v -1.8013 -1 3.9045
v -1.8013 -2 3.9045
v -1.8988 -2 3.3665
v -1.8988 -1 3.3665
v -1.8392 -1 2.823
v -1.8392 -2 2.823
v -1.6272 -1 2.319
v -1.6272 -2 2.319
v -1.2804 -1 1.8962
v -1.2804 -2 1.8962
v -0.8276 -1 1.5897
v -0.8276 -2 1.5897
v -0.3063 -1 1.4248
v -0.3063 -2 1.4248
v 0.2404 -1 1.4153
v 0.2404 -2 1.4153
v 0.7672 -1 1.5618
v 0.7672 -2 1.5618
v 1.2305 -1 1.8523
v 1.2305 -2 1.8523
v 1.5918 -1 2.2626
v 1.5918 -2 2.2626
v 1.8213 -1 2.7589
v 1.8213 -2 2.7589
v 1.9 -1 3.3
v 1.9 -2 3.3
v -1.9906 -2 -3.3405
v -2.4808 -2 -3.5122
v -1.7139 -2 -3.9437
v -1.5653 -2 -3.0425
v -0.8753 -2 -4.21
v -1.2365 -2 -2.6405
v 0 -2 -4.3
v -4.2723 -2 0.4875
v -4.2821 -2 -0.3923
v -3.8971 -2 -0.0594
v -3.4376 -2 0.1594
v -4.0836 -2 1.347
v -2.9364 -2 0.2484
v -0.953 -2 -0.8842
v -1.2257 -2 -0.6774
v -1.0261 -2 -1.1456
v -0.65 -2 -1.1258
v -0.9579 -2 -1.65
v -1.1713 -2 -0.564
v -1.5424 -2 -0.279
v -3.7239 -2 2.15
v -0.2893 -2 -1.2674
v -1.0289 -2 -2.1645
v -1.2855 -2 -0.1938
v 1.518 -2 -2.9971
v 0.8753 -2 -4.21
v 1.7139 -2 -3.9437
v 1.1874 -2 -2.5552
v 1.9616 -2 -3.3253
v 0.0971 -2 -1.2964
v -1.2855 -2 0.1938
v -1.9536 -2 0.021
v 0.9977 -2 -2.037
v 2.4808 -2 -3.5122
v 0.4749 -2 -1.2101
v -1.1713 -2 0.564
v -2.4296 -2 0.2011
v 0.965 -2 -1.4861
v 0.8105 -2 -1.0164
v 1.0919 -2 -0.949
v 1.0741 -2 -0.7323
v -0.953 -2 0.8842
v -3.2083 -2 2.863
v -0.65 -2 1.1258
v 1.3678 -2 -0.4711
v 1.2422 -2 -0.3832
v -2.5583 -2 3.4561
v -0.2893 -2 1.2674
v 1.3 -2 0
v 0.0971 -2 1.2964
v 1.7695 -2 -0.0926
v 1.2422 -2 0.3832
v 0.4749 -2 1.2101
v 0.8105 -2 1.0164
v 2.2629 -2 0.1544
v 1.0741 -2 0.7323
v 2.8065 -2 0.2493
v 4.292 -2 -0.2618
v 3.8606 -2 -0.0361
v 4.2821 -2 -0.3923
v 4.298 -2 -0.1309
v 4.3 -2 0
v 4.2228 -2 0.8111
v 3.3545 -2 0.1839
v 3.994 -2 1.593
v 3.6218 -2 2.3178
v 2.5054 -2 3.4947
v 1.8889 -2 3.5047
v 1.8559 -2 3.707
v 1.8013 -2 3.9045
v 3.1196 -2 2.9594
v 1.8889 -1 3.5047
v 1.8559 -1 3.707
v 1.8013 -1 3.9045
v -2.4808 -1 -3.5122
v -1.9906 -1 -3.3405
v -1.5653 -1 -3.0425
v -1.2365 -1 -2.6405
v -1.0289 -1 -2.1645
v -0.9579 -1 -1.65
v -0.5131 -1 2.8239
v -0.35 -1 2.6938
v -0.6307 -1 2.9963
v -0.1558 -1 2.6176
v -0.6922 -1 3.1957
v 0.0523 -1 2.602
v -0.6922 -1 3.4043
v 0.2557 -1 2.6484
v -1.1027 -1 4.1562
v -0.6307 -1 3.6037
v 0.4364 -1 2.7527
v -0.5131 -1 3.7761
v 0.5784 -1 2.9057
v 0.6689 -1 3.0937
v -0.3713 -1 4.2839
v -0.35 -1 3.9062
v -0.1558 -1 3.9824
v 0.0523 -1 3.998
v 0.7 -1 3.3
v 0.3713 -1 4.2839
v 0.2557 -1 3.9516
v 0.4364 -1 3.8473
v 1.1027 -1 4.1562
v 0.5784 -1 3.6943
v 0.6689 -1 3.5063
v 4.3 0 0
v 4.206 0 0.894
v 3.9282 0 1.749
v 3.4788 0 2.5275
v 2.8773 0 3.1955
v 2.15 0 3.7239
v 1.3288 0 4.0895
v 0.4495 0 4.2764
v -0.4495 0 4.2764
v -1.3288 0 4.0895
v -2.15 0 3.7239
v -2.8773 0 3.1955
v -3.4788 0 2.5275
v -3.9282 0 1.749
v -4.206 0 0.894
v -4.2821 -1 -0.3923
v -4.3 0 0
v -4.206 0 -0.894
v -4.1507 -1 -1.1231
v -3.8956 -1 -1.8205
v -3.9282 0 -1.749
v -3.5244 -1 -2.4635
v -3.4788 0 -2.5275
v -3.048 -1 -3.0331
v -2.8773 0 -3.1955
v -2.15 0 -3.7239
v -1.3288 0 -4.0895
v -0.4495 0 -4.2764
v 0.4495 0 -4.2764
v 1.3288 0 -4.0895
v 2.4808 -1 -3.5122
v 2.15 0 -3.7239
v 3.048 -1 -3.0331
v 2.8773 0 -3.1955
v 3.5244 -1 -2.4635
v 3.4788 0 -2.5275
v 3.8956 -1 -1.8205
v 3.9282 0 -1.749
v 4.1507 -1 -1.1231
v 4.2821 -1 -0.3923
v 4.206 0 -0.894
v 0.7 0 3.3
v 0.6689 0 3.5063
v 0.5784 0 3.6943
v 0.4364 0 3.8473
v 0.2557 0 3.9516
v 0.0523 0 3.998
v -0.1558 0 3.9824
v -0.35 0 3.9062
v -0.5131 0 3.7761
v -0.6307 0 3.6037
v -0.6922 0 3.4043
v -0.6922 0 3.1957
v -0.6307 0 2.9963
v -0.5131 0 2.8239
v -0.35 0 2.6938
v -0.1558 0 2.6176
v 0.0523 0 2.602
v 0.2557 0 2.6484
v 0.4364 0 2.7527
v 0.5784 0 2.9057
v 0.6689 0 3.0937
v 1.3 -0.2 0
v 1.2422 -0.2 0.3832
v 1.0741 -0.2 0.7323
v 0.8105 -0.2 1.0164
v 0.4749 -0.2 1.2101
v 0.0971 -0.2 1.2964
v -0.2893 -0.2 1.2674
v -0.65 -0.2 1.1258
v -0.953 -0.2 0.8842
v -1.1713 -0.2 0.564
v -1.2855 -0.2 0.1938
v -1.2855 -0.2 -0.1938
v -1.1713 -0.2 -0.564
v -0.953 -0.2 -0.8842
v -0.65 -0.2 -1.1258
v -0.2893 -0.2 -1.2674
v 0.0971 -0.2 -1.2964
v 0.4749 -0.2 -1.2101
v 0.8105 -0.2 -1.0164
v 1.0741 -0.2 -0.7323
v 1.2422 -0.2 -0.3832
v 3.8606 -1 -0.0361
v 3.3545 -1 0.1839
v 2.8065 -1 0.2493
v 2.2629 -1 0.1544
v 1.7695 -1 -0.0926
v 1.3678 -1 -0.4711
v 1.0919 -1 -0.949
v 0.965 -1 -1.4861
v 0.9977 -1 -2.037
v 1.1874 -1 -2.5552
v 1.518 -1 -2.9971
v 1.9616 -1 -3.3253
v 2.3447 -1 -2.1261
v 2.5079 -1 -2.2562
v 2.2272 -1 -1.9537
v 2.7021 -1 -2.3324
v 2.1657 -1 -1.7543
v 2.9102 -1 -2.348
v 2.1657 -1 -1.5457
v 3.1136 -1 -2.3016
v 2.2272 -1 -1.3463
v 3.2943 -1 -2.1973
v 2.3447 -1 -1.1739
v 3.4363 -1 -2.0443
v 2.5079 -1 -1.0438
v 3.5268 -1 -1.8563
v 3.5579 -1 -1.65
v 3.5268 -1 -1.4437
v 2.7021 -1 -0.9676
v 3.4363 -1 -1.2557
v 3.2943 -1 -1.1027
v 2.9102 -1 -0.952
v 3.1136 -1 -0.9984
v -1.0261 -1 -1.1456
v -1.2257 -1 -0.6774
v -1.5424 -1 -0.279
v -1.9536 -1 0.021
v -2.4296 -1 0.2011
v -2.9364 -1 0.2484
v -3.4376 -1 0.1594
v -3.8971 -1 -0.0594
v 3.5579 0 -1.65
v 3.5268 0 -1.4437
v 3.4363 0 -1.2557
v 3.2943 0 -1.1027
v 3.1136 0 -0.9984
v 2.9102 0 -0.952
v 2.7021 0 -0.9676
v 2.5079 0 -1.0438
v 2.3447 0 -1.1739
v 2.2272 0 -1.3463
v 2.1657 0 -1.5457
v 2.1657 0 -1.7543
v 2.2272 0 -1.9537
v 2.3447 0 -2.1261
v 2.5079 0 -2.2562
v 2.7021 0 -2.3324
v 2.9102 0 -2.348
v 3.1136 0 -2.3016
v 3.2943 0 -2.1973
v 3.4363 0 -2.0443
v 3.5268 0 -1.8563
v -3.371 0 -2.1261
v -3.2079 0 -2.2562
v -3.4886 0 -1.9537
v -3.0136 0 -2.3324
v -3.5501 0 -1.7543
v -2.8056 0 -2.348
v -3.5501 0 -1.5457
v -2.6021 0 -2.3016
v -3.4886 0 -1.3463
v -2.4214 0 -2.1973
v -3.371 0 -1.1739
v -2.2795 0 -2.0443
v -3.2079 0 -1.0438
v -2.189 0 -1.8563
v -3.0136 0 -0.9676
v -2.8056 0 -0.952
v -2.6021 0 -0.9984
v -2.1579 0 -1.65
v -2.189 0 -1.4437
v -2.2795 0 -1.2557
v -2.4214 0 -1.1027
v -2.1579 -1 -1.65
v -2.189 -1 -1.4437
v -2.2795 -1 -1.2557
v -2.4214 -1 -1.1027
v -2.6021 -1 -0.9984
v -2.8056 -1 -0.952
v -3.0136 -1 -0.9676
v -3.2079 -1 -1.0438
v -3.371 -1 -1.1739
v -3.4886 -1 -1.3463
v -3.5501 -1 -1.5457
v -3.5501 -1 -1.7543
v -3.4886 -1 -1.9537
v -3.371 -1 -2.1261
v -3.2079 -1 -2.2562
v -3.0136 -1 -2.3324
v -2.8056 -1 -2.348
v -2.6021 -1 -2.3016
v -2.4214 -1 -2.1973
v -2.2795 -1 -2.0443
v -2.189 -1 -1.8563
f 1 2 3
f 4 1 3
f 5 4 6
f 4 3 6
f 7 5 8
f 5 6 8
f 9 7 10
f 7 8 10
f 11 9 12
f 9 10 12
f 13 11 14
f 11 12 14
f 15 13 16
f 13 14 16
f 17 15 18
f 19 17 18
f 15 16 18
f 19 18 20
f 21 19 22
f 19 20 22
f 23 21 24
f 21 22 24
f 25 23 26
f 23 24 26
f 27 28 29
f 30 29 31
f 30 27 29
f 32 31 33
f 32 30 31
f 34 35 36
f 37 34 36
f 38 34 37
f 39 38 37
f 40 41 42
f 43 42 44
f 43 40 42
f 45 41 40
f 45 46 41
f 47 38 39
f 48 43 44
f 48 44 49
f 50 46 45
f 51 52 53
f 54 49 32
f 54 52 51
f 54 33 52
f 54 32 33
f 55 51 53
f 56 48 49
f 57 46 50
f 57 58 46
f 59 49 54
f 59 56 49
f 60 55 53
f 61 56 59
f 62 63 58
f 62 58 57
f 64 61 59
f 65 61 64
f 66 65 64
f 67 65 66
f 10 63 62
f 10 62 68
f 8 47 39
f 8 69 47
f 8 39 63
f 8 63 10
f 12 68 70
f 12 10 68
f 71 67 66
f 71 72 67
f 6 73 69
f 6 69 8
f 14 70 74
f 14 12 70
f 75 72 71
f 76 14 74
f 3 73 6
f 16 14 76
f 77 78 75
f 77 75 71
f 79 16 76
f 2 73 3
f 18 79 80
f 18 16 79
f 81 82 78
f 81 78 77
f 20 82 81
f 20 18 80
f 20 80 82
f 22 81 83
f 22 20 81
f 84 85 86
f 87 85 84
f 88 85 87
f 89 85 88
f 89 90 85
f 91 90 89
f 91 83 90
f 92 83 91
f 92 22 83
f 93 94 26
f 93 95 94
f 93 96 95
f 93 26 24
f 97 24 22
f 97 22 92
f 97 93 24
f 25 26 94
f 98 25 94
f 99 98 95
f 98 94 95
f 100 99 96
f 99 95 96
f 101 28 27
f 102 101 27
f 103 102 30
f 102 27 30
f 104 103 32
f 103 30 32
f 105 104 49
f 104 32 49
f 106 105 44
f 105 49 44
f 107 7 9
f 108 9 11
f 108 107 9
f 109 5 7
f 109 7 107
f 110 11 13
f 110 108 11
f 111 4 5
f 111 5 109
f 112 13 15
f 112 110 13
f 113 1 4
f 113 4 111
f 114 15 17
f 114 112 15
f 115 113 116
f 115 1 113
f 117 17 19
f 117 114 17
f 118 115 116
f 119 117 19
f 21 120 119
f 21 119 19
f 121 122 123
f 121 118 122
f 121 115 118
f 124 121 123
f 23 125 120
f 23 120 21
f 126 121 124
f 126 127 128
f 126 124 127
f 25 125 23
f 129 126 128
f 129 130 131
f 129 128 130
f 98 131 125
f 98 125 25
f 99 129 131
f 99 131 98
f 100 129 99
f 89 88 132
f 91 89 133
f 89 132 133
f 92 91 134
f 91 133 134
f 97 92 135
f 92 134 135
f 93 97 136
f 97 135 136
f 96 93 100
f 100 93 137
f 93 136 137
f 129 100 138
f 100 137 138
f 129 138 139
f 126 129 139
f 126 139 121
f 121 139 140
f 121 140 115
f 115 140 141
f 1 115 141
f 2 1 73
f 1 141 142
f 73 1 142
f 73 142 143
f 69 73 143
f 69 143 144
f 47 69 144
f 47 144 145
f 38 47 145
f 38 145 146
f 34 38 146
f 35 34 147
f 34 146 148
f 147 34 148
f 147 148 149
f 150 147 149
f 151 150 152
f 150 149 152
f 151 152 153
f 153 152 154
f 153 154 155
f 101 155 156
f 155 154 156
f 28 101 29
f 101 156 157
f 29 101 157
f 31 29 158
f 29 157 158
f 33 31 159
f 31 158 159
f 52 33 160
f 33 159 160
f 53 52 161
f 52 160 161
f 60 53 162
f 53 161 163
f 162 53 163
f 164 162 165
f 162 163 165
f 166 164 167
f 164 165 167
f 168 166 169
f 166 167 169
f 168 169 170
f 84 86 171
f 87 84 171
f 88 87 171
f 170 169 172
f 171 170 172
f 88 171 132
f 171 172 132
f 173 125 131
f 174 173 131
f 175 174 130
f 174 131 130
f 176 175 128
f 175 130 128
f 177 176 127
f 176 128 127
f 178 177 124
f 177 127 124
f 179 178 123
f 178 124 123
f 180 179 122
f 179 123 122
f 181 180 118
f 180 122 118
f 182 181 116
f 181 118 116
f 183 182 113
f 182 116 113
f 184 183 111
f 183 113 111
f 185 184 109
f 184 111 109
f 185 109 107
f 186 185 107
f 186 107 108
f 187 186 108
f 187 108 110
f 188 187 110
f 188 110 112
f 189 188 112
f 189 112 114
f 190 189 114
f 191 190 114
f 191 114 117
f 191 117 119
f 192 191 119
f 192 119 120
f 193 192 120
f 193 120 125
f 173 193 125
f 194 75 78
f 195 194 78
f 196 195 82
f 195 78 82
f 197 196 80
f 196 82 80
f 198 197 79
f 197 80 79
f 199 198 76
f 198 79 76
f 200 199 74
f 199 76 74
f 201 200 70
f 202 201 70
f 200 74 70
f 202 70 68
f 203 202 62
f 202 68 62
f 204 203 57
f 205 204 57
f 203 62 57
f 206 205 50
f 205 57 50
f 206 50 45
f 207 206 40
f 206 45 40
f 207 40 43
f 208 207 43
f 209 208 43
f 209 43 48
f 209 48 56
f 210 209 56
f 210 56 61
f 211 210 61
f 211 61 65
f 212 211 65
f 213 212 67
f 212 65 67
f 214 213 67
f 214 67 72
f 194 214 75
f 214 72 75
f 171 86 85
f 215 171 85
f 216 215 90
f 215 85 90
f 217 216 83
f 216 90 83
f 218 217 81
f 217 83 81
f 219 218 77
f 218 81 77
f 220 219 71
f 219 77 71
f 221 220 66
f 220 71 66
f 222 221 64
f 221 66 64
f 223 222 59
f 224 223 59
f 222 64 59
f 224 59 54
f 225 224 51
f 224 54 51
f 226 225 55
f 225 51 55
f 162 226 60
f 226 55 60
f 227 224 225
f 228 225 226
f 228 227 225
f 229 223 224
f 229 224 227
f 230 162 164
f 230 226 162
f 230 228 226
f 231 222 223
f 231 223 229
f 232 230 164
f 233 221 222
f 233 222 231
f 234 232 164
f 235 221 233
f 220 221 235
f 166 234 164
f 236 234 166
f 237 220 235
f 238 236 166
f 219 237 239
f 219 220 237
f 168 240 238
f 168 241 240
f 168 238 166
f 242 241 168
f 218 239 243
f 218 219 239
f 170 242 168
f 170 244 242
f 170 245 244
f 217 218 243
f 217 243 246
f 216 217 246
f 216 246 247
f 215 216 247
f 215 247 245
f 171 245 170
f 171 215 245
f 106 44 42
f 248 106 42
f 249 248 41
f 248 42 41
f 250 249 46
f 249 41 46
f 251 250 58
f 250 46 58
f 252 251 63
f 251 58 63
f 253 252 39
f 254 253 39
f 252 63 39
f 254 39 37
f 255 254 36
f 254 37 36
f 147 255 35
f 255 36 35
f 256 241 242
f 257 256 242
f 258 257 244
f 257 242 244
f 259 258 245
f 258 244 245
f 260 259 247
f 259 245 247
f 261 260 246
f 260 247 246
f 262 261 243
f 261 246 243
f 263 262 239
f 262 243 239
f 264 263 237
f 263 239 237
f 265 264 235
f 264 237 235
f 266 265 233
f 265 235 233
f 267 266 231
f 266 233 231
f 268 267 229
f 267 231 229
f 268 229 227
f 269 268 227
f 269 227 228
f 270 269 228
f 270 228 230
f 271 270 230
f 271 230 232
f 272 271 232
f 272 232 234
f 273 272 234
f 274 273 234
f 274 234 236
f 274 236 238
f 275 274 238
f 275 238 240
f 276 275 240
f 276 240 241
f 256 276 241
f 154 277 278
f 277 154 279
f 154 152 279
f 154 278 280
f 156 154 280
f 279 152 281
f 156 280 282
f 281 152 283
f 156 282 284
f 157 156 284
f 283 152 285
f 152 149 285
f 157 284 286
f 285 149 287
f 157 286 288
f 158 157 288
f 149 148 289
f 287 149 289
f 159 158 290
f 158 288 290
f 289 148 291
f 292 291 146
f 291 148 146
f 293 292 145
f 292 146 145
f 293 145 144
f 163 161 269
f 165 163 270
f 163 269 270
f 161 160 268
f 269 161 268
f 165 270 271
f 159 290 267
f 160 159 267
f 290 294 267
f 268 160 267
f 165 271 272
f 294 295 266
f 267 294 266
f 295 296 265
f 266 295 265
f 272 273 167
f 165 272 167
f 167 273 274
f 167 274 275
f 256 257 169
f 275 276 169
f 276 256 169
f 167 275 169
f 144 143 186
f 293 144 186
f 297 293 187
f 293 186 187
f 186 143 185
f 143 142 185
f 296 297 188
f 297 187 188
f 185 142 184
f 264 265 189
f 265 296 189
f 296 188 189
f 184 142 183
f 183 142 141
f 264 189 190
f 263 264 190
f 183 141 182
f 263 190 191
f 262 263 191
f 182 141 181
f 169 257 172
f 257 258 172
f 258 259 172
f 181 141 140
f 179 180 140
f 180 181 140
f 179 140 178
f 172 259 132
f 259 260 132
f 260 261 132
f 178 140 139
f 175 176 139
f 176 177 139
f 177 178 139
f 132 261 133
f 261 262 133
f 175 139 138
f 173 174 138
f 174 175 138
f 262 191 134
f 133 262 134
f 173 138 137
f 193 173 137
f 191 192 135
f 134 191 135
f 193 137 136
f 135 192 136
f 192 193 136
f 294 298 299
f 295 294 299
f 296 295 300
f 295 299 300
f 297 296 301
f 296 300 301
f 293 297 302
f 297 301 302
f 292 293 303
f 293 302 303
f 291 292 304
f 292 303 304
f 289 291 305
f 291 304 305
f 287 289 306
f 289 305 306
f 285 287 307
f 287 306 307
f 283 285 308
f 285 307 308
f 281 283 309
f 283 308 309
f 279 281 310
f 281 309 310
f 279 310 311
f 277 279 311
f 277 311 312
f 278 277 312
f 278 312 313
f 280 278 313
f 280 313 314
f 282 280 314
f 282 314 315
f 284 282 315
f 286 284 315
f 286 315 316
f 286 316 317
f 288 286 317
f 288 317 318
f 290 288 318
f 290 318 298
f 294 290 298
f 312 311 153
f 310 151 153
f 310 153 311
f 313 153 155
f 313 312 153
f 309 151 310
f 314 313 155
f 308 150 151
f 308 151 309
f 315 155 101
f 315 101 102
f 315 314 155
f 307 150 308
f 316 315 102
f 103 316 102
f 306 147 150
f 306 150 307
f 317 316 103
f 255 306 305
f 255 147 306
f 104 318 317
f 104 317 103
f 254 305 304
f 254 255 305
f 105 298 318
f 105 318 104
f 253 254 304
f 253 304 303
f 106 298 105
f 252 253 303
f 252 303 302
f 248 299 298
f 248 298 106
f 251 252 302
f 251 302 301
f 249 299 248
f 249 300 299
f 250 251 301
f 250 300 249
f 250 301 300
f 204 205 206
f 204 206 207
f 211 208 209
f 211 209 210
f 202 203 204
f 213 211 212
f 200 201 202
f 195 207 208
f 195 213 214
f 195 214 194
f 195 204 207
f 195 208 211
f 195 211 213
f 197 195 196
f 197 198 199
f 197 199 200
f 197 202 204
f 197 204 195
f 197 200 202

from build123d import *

# Parameters (mm, degrees)
F0_R     = 4.3
F1_DEPTH = 2
F2_R     = 0.7
F3_DEPTH = 1
F4_DEPTH = 2
F5_R     = 1.3
F6_DEPTH = 1.8


with BuildPart() as f1:
    # F0 (on Front) → F1 (new body)
    with BuildSketch(Plane.XZ):
        Circle(F0_R)
    extrude(amount=F1_DEPTH)

    # F2 (on face) → F3 (cut)
    with BuildSketch(Plane.XZ.offset(2)):
        with BuildLine():
            ThreePointArc((-1.8012564485, 3.9045454545), (-0.3062782622, 1.4248483725), (1.9, 3.3))
            ThreePointArc((1.9, 3.3), (1.8751516275, 3.6062782622), (1.8012564485, 3.9045454545))
            ThreePointArc((1.8012564485, 3.9045454545), (0, 4.3), (-1.8012564485, 3.9045454545))
        make_face()
        with Locations((0, 3.3)):
            Circle(F2_R, mode=Mode.SUBTRACT)
        with BuildLine():
            ThreePointArc((-0.9578838325, -1.65), (-2.1855527744, 0.1270680765), (-4.2820637781, -0.3923388841))
            ThreePointArc((-4.2820637781, -0.3923388841), (-3.7239092363, -2.15), (-2.4808073296, -3.5122065704))
            ThreePointArc((-2.4808073296, -3.5122065704), (-1.3870940182, -2.8528205694), (-0.9578838325, -1.65))
        make_face()
        with Locations((-2.8578838325, -1.65)):
            Circle(F2_R, mode=Mode.SUBTRACT)
        with BuildLine():
            ThreePointArc((2.4808073296, -3.5122065704), (3.7239092363, -2.15), (4.2820637781, -0.3923388841))
            ThreePointArc((4.2820637781, -0.3923388841), (1.2124355653, -0.7), (2.4808073296, -3.5122065704))
        make_face()
        with Locations((2.8578838325, -1.65)):
            Circle(F2_R, mode=Mode.SUBTRACT)
    extrude(amount=-F3_DEPTH, mode=Mode.SUBTRACT)

    # F4 (cut): faces of the model
    f4_faces = [f1.faces().sort_by_distance(p)[0] for p in [
        (0, -2, 3.3),
        (-2.8578838325, -2, -1.65),
        (2.8578838325, -2, -1.65),
    ]]
    extrude(f4_faces, amount=-F4_DEPTH, mode=Mode.SUBTRACT)

    # F5 (on face) → F6 (cut)
    with BuildSketch(Plane.XZ.offset(2)):
        Circle(F5_R)
    extrude(amount=-F6_DEPTH, mode=Mode.SUBTRACT)


solid = f1.part
